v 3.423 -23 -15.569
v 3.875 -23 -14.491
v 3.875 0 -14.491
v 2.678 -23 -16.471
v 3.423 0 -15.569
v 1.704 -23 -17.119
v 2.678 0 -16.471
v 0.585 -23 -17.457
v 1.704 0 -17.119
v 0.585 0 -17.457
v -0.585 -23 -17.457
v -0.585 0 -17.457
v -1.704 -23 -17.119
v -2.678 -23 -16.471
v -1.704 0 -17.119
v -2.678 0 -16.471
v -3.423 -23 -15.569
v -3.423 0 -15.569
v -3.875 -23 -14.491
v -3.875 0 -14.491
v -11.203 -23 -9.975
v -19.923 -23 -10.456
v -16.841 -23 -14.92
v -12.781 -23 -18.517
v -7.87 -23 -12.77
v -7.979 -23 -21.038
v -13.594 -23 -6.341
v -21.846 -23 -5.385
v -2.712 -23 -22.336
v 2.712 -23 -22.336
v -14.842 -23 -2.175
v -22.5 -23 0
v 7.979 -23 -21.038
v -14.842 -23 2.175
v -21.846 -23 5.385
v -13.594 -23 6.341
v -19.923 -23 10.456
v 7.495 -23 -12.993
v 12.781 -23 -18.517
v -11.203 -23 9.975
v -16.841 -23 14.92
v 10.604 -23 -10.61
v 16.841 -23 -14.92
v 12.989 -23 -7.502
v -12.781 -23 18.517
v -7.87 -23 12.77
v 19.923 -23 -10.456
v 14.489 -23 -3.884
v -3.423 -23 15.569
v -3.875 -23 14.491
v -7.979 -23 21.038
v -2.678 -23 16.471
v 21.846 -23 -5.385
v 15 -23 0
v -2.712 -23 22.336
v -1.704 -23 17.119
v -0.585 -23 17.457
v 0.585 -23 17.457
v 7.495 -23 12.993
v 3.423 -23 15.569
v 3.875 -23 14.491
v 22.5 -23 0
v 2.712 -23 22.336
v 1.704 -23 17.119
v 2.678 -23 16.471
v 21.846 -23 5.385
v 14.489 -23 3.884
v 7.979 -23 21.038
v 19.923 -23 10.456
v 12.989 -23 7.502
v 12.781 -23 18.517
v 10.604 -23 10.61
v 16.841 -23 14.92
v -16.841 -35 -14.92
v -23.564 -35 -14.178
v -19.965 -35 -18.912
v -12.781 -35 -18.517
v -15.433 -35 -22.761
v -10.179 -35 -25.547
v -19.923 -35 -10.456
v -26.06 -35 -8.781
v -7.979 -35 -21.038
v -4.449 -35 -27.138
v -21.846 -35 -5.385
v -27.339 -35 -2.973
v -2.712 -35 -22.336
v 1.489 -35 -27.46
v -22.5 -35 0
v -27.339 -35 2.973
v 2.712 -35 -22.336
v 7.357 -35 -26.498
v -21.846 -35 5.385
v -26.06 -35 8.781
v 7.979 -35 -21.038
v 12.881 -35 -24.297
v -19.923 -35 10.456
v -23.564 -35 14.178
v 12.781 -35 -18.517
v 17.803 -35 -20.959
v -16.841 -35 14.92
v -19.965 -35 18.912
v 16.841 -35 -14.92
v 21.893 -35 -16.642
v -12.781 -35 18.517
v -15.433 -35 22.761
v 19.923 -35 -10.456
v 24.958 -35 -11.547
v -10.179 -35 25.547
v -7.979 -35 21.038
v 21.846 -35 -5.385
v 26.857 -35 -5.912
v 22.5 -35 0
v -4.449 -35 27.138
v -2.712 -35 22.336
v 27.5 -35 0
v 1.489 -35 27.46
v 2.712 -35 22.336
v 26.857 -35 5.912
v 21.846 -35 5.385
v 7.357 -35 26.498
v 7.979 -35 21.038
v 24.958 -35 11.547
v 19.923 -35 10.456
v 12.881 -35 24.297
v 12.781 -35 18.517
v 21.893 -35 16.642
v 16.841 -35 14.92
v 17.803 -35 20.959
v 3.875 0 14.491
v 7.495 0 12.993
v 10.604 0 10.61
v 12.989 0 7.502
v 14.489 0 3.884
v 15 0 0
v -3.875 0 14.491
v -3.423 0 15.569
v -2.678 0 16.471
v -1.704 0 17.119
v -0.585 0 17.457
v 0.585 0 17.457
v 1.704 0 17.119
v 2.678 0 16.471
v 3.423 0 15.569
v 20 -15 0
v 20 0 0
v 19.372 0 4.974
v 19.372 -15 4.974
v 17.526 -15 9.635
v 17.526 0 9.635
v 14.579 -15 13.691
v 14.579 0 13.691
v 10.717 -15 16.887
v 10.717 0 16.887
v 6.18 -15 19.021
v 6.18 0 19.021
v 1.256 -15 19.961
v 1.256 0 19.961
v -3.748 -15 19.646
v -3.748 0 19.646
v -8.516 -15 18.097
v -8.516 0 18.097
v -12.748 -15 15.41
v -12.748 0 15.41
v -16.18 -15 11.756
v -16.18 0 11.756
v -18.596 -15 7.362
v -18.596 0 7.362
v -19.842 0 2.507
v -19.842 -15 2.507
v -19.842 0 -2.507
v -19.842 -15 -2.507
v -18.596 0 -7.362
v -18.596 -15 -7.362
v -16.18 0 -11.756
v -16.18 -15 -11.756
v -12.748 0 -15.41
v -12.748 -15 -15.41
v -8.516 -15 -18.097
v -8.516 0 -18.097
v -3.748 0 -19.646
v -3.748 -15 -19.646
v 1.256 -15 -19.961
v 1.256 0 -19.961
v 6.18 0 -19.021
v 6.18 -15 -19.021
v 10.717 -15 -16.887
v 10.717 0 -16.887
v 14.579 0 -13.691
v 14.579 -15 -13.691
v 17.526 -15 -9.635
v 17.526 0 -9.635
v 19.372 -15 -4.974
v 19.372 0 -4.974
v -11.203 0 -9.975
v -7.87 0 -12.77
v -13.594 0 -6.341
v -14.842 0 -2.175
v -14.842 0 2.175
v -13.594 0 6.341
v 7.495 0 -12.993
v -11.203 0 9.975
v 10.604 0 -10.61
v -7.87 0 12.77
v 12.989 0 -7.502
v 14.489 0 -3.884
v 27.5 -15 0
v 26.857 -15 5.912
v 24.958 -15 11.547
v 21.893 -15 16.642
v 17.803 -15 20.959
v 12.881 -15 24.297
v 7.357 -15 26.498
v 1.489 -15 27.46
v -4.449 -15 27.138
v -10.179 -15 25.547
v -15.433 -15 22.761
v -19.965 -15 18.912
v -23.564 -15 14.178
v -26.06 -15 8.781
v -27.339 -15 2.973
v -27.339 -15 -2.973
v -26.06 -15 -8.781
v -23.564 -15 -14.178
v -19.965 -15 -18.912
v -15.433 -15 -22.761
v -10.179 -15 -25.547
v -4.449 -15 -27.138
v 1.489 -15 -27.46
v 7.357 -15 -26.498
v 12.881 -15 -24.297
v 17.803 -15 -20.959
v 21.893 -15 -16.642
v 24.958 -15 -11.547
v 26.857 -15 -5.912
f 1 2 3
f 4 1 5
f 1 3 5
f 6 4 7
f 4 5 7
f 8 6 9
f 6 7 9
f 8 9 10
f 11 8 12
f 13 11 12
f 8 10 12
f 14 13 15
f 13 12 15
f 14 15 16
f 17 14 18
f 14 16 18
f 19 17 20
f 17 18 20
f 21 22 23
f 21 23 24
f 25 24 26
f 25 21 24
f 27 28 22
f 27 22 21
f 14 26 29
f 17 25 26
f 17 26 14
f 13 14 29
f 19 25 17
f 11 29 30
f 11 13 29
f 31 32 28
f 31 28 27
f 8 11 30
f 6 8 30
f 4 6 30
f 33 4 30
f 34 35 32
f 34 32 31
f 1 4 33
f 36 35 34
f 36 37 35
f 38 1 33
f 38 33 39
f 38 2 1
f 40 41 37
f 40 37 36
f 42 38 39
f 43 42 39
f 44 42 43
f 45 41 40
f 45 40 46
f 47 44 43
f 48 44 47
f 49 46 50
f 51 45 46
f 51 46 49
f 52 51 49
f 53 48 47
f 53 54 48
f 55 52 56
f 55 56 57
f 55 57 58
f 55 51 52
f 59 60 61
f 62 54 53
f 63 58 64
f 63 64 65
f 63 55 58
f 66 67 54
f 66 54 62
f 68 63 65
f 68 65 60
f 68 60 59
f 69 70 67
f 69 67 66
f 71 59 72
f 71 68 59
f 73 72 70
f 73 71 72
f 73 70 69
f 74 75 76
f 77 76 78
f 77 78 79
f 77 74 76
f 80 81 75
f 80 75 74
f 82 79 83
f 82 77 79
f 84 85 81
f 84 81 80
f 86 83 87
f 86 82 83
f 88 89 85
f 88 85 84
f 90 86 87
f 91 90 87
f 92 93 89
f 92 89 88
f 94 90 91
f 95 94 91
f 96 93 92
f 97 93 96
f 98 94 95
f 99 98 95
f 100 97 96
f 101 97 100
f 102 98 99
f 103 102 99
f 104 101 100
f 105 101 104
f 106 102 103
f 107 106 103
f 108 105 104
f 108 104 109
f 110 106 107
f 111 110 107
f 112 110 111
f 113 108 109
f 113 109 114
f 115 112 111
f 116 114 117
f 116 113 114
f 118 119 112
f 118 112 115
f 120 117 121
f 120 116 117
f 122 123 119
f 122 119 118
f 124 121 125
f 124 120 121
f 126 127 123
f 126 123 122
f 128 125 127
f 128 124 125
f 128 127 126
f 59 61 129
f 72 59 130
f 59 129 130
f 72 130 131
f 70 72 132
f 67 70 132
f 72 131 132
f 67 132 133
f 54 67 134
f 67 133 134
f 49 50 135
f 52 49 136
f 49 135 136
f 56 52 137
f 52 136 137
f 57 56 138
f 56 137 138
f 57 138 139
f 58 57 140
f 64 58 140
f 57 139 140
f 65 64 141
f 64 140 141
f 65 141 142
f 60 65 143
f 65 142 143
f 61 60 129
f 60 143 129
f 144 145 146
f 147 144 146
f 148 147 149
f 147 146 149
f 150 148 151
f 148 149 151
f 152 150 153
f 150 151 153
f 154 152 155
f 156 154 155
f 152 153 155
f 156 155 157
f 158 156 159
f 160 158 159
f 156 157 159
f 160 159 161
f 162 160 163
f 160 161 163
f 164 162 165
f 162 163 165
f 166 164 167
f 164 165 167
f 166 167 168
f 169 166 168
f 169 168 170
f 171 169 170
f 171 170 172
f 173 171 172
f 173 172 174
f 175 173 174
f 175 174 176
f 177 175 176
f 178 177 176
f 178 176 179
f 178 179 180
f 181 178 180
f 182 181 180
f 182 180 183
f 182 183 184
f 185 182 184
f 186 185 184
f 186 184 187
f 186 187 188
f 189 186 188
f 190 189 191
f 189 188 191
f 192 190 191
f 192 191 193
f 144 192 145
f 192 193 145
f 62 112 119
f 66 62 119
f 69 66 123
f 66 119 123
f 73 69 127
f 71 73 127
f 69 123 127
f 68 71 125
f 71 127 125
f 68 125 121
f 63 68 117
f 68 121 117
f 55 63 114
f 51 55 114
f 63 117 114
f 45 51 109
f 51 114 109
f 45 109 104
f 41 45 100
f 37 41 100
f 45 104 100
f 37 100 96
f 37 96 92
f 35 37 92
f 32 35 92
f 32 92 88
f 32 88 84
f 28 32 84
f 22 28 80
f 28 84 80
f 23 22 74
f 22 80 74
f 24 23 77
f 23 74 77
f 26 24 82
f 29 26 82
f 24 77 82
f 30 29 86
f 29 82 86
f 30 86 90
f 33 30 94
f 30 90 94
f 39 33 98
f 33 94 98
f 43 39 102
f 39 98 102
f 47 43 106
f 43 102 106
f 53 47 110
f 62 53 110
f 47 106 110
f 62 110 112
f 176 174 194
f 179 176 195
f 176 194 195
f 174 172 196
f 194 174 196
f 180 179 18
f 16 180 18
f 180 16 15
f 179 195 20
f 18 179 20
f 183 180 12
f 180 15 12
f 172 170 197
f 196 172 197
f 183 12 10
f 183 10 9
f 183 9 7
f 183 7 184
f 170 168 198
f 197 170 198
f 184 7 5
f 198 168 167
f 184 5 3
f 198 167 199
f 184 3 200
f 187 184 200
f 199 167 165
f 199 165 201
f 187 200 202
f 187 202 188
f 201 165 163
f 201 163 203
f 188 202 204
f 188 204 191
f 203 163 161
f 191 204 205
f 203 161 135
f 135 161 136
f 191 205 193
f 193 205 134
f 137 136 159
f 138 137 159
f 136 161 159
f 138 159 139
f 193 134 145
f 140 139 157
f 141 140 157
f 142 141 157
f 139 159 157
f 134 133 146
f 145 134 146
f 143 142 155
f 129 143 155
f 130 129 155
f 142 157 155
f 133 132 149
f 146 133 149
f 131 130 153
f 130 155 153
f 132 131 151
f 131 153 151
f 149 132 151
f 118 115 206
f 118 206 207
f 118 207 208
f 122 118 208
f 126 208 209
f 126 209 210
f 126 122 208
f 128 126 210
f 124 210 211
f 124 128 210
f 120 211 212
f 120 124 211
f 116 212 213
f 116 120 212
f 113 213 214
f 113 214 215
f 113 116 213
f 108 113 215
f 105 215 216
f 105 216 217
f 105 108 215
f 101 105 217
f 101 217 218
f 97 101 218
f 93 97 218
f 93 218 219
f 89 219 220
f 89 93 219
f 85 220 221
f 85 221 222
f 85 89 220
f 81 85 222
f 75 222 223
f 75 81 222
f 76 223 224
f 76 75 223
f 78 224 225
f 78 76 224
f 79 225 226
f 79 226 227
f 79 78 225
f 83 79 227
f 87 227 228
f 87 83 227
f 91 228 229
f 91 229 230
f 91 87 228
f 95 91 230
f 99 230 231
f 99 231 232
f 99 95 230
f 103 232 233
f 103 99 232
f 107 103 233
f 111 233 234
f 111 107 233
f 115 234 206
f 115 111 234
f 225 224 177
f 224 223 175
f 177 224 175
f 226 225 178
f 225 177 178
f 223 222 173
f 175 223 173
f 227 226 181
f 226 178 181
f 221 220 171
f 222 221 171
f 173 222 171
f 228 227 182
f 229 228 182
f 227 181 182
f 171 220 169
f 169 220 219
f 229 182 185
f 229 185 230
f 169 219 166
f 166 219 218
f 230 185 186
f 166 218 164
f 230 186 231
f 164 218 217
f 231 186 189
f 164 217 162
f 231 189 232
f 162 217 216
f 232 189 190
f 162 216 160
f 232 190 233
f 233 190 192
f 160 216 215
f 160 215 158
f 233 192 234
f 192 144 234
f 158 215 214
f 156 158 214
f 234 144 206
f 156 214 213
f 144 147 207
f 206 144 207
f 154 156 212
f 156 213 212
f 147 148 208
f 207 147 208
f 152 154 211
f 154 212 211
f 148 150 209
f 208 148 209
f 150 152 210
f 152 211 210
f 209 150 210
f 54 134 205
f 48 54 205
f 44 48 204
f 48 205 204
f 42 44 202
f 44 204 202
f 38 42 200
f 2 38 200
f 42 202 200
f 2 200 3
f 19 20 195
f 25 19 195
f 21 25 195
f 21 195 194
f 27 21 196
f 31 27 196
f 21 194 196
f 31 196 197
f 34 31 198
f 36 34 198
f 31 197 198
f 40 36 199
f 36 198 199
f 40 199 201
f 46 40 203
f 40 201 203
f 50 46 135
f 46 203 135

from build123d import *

# Parameters (mm, degrees)
F0_R     = 20
F1_DEPTH = 35
F2_R     = 27.5
F2_R_2   = 20
F3_DEPTH = 20
F4_R     = 22.5
F5_DEPTH = 12


with BuildPart() as f1:
    # F0 (on Front) → F1 (new body)
    with BuildSketch(Plane.XZ):
        Circle(F0_R)
        with BuildLine():
            ThreePointArc((3.875362, 14.490741), (11.898118, 9.134264), (15, 0))
            ThreePointArc((15, 0), (11.898118, -9.134264), (3.875362, -14.490741))
            ThreePointArc((3.875362, -14.490741), (0, -17.5), (-3.875362, -14.490741))
            ThreePointArc((-3.875362, -14.490741), (-15, 0), (-3.875362, 14.490741))
            ThreePointArc((-3.875362, 14.490741), (0, 17.5), (3.875362, 14.490741))
        make_face(mode=Mode.SUBTRACT)
    extrude(amount=F1_DEPTH)

    # F2 (on face) → F3 (join)
    with BuildSketch(Plane.XZ.offset(35)):
        Circle(F2_R)
        Circle(F2_R_2, mode=Mode.SUBTRACT)
    extrude(amount=-F3_DEPTH)

    # F4 (on face) → F5 (cut)
    with BuildSketch(Plane.XZ.offset(35)):
        Circle(F4_R)
    extrude(amount=-F5_DEPTH, mode=Mode.SUBTRACT)


solid = f1.part
